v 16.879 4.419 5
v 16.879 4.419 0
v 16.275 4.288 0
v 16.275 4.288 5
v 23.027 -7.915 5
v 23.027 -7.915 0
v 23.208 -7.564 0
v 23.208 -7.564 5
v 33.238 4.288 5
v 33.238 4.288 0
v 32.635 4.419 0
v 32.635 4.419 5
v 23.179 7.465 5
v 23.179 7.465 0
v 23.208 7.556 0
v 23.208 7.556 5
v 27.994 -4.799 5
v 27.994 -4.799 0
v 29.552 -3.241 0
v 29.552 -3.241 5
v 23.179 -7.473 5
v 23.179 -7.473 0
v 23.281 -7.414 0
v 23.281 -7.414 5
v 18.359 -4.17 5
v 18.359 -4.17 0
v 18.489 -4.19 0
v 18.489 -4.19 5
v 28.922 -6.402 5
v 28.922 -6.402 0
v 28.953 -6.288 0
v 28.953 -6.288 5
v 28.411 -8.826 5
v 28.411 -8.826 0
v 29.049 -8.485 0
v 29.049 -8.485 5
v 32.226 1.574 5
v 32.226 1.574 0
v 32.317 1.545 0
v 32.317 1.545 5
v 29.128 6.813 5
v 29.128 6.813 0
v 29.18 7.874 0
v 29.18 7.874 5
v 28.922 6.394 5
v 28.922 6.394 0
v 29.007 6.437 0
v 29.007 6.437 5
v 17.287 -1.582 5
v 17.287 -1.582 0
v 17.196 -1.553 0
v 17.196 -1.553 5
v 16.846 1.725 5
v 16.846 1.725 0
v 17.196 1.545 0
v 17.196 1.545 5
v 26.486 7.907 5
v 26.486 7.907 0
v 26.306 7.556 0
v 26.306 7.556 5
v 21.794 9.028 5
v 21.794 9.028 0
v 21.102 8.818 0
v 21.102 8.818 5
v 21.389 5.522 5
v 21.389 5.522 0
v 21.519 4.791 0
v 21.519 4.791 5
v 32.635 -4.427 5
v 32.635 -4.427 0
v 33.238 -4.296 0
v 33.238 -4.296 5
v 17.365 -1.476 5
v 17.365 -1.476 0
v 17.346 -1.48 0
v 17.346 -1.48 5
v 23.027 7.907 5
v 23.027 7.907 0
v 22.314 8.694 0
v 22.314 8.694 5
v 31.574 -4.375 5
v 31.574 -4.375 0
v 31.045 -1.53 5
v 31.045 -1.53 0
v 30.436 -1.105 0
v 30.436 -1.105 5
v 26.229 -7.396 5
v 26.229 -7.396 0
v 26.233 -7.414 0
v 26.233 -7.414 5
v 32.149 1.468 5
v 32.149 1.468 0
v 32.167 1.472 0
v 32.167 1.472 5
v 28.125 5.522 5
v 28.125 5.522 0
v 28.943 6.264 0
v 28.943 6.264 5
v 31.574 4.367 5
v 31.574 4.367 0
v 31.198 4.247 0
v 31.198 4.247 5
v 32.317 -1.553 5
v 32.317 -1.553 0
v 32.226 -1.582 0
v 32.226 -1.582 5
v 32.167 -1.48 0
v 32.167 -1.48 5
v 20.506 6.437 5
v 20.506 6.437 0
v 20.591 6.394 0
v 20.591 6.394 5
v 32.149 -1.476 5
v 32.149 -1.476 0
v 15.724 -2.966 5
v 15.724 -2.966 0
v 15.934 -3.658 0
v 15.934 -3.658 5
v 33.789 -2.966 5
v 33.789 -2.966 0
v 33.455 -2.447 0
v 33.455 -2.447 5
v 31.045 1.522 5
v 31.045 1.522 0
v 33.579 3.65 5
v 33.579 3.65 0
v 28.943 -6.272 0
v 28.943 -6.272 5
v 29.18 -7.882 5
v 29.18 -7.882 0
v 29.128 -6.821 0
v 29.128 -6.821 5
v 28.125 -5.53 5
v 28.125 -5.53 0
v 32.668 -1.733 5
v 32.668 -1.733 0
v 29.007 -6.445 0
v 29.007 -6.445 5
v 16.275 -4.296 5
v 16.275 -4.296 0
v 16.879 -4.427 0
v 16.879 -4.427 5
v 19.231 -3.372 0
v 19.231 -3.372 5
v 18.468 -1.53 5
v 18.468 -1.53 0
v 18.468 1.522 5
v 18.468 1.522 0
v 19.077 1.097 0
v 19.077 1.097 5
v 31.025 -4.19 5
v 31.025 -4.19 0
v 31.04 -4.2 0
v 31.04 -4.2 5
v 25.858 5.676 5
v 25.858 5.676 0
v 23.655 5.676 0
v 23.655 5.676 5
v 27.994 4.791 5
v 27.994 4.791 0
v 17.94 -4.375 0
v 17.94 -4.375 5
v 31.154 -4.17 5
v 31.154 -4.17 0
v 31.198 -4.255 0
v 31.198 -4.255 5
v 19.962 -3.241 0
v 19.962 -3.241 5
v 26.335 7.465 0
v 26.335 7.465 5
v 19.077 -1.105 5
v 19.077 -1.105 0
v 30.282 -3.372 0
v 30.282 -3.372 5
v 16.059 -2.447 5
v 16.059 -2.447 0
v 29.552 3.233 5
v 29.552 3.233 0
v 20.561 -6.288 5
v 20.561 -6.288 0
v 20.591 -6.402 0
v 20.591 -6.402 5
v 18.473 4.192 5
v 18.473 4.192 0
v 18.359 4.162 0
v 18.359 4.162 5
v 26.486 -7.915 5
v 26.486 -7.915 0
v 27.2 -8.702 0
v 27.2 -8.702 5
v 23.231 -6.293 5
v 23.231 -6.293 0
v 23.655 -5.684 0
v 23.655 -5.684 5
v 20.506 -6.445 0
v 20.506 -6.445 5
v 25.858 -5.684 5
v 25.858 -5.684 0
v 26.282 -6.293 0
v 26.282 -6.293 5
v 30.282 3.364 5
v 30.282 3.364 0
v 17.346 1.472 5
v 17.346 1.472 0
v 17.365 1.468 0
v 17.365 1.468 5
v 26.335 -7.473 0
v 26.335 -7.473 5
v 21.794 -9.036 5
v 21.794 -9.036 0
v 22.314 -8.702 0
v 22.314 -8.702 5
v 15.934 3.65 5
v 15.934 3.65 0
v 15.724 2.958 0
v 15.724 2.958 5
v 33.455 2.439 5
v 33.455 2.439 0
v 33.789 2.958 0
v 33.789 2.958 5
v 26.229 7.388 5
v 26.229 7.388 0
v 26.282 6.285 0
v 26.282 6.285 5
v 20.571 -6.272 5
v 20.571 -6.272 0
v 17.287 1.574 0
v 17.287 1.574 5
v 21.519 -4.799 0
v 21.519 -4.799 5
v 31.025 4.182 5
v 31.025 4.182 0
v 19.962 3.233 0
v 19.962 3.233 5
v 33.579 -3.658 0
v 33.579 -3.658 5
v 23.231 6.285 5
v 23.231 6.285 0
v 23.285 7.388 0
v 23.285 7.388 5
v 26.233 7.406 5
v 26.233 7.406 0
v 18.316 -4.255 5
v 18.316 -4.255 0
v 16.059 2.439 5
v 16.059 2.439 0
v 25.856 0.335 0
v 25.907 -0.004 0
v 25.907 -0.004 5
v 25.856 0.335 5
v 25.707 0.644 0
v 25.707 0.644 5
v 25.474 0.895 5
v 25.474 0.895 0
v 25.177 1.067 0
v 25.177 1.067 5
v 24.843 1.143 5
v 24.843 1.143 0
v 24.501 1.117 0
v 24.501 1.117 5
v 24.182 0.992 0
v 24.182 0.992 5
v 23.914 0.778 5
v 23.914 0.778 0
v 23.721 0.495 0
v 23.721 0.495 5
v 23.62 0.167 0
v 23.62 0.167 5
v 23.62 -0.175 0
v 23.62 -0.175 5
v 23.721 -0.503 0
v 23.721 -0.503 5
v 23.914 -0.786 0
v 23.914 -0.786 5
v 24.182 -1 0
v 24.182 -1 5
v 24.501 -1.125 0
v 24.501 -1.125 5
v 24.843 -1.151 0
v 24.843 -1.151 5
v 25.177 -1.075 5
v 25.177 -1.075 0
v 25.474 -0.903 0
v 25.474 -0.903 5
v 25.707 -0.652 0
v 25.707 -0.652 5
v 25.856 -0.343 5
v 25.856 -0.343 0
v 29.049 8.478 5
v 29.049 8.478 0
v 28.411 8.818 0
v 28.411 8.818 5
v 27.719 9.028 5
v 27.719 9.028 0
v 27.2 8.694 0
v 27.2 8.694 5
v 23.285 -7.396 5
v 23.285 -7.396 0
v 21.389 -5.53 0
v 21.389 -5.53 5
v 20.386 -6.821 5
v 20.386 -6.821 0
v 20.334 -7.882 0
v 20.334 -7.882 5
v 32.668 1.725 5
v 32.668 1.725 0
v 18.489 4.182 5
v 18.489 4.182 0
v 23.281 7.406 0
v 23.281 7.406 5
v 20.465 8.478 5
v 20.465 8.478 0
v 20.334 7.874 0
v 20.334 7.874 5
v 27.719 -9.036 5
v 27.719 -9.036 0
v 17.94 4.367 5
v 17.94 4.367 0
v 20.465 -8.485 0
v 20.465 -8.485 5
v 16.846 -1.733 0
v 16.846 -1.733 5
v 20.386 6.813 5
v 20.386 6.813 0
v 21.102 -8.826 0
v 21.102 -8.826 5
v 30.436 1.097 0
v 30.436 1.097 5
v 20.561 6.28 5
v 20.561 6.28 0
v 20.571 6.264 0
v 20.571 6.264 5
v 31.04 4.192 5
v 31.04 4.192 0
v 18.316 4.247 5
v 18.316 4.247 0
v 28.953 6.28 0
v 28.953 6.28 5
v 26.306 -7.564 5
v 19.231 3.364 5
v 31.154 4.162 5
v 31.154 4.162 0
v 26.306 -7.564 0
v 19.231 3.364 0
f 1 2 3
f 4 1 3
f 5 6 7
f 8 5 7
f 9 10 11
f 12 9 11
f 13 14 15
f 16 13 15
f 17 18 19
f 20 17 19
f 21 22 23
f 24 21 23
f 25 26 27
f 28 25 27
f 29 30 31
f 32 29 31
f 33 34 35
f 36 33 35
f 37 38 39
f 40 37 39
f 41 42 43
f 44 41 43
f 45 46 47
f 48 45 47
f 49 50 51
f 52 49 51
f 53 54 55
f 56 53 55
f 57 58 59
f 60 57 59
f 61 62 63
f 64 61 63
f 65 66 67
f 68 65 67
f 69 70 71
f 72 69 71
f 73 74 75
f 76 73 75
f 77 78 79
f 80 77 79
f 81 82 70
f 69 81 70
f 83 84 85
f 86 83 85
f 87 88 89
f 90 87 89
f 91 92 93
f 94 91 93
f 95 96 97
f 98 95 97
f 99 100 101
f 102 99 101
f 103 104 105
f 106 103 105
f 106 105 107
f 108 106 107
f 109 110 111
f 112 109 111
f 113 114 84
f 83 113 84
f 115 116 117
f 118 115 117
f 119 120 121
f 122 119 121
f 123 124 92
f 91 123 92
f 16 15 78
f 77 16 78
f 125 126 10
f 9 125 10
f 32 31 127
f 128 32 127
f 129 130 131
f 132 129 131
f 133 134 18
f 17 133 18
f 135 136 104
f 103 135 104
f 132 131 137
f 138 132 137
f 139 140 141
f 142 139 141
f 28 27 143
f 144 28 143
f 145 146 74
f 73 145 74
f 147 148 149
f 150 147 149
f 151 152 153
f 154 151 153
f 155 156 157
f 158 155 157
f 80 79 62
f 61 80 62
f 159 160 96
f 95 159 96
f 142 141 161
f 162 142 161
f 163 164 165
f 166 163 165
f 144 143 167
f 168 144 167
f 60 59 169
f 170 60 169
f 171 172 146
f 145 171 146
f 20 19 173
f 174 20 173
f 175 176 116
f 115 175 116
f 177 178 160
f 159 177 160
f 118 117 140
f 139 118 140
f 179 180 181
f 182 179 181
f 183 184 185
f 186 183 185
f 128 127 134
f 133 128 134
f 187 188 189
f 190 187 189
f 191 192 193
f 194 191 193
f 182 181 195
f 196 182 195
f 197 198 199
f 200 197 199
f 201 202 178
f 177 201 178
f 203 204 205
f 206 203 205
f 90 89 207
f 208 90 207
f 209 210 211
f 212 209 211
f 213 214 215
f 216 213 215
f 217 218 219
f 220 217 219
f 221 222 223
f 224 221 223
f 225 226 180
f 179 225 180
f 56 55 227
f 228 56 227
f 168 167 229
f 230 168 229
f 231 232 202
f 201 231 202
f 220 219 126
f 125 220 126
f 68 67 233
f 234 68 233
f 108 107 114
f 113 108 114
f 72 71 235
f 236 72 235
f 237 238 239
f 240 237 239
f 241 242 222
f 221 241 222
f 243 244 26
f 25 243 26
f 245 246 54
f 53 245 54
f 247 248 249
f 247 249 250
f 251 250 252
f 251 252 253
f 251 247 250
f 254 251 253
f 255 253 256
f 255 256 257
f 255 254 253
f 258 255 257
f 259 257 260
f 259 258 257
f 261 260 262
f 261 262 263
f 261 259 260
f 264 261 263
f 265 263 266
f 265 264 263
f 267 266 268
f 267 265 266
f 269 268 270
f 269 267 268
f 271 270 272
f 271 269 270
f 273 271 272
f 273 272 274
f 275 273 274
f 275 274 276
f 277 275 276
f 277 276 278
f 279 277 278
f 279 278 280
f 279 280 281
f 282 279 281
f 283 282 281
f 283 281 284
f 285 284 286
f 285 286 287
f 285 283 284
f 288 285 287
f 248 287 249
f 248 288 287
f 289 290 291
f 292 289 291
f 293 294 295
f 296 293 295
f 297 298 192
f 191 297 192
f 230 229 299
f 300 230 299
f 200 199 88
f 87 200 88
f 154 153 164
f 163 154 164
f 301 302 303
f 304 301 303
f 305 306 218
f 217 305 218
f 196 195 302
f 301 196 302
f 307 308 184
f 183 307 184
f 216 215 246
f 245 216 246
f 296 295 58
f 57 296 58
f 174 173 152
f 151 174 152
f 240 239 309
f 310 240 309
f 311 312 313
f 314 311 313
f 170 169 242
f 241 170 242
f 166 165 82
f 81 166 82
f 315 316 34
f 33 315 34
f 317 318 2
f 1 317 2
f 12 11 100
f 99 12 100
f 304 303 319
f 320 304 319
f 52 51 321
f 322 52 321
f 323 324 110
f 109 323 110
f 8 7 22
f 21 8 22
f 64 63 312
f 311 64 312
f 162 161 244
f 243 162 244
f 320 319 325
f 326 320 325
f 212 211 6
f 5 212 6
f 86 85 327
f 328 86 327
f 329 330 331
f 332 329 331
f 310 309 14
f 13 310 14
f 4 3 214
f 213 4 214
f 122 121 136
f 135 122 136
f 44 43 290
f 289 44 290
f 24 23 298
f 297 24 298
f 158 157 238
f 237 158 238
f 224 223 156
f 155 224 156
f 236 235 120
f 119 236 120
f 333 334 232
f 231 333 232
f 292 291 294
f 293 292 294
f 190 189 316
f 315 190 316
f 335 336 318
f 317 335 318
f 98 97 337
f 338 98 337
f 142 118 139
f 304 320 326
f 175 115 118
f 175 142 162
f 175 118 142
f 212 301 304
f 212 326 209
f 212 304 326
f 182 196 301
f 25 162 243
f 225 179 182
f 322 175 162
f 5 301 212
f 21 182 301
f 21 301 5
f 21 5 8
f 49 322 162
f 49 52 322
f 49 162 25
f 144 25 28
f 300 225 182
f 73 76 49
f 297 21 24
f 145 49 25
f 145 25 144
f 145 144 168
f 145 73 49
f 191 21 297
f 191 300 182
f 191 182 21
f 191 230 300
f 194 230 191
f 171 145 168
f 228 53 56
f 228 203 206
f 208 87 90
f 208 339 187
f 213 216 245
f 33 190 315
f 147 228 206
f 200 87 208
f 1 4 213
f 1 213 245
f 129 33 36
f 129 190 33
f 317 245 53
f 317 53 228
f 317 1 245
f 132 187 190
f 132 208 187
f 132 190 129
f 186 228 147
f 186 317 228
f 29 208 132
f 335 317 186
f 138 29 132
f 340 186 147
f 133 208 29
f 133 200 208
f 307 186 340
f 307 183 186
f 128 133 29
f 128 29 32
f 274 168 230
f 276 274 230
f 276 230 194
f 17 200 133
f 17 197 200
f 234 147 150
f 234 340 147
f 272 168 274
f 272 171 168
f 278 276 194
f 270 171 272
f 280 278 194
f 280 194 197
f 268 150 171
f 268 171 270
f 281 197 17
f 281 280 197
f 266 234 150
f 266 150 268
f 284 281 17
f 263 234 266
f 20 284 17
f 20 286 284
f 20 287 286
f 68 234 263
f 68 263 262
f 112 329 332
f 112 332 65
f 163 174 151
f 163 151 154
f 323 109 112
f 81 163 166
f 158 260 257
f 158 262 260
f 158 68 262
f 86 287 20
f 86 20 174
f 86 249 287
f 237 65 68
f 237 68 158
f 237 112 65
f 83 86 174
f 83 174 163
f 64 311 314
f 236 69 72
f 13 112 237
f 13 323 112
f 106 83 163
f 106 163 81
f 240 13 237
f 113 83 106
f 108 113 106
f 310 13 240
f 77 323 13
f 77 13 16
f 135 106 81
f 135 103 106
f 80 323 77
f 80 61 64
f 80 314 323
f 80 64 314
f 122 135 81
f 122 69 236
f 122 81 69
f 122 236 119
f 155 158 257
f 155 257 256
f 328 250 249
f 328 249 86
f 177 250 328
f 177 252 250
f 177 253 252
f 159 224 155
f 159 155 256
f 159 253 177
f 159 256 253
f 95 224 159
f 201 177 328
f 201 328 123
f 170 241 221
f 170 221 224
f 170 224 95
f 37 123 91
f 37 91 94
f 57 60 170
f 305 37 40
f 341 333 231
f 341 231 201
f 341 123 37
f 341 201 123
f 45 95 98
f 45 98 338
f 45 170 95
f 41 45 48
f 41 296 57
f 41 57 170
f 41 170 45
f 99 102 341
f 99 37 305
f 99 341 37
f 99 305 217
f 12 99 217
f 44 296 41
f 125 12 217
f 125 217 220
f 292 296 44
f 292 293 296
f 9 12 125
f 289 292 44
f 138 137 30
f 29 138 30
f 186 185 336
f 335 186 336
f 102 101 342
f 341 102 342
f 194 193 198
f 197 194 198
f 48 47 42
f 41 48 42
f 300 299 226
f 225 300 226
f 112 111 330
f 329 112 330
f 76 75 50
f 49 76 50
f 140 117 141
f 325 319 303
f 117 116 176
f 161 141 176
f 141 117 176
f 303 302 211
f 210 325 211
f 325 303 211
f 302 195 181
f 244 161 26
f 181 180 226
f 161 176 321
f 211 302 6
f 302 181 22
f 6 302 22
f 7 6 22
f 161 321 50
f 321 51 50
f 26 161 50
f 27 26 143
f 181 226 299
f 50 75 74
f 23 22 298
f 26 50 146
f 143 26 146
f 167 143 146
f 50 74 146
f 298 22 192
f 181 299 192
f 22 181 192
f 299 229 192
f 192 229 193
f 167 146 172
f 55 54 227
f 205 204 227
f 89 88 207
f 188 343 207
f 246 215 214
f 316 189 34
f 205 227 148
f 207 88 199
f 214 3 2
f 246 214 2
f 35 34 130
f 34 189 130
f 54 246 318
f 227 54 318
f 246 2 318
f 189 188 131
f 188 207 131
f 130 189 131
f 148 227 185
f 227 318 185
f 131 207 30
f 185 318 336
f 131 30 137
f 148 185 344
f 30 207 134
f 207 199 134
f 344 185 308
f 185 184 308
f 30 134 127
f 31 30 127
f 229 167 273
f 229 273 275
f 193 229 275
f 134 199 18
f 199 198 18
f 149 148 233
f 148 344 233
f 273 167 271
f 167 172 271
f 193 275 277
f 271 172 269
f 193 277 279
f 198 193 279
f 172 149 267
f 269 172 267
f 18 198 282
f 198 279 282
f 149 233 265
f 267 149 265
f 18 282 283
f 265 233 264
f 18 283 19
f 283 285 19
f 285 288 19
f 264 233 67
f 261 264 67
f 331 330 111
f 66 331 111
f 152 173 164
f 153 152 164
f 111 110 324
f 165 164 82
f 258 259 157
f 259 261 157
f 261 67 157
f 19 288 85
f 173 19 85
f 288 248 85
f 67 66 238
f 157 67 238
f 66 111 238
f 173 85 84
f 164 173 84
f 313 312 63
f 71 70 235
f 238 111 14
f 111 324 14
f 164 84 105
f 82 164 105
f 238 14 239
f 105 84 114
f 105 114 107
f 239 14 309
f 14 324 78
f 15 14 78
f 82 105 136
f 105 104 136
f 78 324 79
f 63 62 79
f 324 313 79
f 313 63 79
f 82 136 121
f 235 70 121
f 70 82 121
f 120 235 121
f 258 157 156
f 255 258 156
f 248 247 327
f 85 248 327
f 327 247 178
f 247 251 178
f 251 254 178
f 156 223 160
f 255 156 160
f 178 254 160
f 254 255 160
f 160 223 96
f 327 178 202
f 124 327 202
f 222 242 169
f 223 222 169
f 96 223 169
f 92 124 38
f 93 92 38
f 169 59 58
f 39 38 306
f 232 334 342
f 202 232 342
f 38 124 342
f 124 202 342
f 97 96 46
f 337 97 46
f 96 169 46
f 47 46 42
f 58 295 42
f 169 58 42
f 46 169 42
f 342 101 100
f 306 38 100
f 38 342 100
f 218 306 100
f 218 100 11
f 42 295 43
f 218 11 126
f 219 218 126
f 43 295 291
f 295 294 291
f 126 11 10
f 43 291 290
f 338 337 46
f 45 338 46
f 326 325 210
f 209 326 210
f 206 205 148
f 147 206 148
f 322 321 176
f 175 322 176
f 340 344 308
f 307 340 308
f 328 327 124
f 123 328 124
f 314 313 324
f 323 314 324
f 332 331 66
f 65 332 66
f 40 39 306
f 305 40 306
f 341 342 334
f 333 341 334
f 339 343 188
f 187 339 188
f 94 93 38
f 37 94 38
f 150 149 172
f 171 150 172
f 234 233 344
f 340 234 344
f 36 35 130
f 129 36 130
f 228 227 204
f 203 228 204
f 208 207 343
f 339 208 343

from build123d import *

# Parameters (mm, degrees)
F0_R     = 1.15
F1_DEPTH = 5


with BuildPart() as f1:
    # F0 (on Top) → F1 (new body)
    with BuildSketch(Plane.XY):
        Polygon((16.878815, 4.41878), (16.275237, 4.288141), (15.934336, 3.650362), (15.724411, 2.95833), (16.05883, 2.439161), (16.845622, 1.725423), (17.196477, 1.54501), (17.287369, 1.574171), (17.346336, 1.472038), (17.364772, 1.468048), (18.46798, 1.521759), (19.077158, 1.09742), (19.077158, -1.105412), (18.46798, -1.529751), (17.364772, -1.47604), (17.346336, -1.48003), (17.287369, -1.582163), (17.196477, -1.553002), (16.845622, -1.733415), (16.05883, -2.447153), (15.724411, -2.966322), (15.934336, -3.658354), (16.275237, -4.296133), (16.878815, -4.426772), (17.93985, -4.375114), (18.315512, -4.254594), (18.359164, -4.169703), (18.488936, -4.190011), (19.231042, -3.371947), (19.961849, -3.241246), (21.519487, -4.798883), (21.388785, -5.52969), (20.570721, -6.271796), (20.560505, -6.287654), (20.591029, -6.401568), (20.506138, -6.44522), (20.385618, -6.820882), (20.33396, -7.881917), (20.464599, -8.485495), (21.102378, -8.826396), (21.79441, -9.036321), (22.313579, -8.701902), (23.027317, -7.91511), (23.20773, -7.564255), (23.178569, -7.473363), (23.280702, -7.414397), (23.284692, -7.39596), (23.230981, -6.292752), (23.65532, -5.683574), (25.858152, -5.683574), (26.282491, -6.292752), (26.22878, -7.39596), (26.23277, -7.414397), (26.334903, -7.473363), (26.305743, -7.564255), (26.486155, -7.91511), (27.199893, -8.701902), (27.719062, -9.036321), (28.411094, -8.826396), (29.048874, -8.485495), (29.179512, -7.881917), (29.127854, -6.820882), (29.007334, -6.44522), (28.922444, -6.401568), (28.952967, -6.287654), (28.942751, -6.271796), (28.124687, -5.52969), (27.993986, -4.798883), (29.551623, -3.241246), (30.28243, -3.371947), (31.024536, -4.190011), (31.040394, -4.200227), (31.154308, -4.169703), (31.19796, -4.254594), (31.573623, -4.375114), (32.634657, -4.426772), (33.238235, -4.296133), (33.579136, -3.658354), (33.789061, -2.966322), (33.454642, -2.447153), (32.66785, -1.733415), (32.316996, -1.553002), (32.226103, -1.582163), (32.167137, -1.48003), (32.1487, -1.47604), (31.045493, -1.529751), (30.436314, -1.105412), (30.436314, 1.09742), (31.045493, 1.521759), (32.1487, 1.468048), (32.167137, 1.472038), (32.226103, 1.574171), (32.316996, 1.54501), (32.66785, 1.725423), (33.454642, 2.439161), (33.789061, 2.95833), (33.579136, 3.650362), (33.238235, 4.288141), (32.634657, 4.41878), (31.573623, 4.367122), (31.19796, 4.246602), (31.154308, 4.161711), (31.040394, 4.192235), (31.024536, 4.182019), (30.28243, 3.363955), (29.551623, 3.233254), (27.993986, 4.790891), (28.124687, 5.521698), (28.942751, 6.263804), (28.952967, 6.279662), (28.922444, 6.393576), (29.007334, 6.437228), (29.127854, 6.81289), (29.179512, 7.873925), (29.048874, 8.477503), (28.411094, 8.818404), (27.719062, 9.028329), (27.199893, 8.69391), (26.486155, 7.907118), (26.305743, 7.556263), (26.334903, 7.465371), (26.23277, 7.406405), (26.22878, 7.387968), (26.282491, 6.28476), (25.858152, 5.675582), (23.65532, 5.675582), (23.230981, 6.28476), (23.284692, 7.387968), (23.280702, 7.406405), (23.178569, 7.465371), (23.20773, 7.556263), (23.027317, 7.907118), (22.313579, 8.69391), (21.79441, 9.028329), (21.102378, 8.818404), (20.464599, 8.477503), (20.33396, 7.873925), (20.385618, 6.81289), (20.506138, 6.437228), (20.591029, 6.393576), (20.560505, 6.279662), (20.570721, 6.263804), (21.388785, 5.521698), (21.519487, 4.790891), (19.961849, 3.233254), (19.231042, 3.363955), (18.488936, 4.182019), (18.473078, 4.192235), (18.359164, 4.161711), (18.315512, 4.246602), (17.93985, 4.367122), align=None)
        with Locations((24.756736, -0.003996)):
            Circle(F0_R, mode=Mode.SUBTRACT)
    extrude(amount=F1_DEPTH)


solid = f1.part
